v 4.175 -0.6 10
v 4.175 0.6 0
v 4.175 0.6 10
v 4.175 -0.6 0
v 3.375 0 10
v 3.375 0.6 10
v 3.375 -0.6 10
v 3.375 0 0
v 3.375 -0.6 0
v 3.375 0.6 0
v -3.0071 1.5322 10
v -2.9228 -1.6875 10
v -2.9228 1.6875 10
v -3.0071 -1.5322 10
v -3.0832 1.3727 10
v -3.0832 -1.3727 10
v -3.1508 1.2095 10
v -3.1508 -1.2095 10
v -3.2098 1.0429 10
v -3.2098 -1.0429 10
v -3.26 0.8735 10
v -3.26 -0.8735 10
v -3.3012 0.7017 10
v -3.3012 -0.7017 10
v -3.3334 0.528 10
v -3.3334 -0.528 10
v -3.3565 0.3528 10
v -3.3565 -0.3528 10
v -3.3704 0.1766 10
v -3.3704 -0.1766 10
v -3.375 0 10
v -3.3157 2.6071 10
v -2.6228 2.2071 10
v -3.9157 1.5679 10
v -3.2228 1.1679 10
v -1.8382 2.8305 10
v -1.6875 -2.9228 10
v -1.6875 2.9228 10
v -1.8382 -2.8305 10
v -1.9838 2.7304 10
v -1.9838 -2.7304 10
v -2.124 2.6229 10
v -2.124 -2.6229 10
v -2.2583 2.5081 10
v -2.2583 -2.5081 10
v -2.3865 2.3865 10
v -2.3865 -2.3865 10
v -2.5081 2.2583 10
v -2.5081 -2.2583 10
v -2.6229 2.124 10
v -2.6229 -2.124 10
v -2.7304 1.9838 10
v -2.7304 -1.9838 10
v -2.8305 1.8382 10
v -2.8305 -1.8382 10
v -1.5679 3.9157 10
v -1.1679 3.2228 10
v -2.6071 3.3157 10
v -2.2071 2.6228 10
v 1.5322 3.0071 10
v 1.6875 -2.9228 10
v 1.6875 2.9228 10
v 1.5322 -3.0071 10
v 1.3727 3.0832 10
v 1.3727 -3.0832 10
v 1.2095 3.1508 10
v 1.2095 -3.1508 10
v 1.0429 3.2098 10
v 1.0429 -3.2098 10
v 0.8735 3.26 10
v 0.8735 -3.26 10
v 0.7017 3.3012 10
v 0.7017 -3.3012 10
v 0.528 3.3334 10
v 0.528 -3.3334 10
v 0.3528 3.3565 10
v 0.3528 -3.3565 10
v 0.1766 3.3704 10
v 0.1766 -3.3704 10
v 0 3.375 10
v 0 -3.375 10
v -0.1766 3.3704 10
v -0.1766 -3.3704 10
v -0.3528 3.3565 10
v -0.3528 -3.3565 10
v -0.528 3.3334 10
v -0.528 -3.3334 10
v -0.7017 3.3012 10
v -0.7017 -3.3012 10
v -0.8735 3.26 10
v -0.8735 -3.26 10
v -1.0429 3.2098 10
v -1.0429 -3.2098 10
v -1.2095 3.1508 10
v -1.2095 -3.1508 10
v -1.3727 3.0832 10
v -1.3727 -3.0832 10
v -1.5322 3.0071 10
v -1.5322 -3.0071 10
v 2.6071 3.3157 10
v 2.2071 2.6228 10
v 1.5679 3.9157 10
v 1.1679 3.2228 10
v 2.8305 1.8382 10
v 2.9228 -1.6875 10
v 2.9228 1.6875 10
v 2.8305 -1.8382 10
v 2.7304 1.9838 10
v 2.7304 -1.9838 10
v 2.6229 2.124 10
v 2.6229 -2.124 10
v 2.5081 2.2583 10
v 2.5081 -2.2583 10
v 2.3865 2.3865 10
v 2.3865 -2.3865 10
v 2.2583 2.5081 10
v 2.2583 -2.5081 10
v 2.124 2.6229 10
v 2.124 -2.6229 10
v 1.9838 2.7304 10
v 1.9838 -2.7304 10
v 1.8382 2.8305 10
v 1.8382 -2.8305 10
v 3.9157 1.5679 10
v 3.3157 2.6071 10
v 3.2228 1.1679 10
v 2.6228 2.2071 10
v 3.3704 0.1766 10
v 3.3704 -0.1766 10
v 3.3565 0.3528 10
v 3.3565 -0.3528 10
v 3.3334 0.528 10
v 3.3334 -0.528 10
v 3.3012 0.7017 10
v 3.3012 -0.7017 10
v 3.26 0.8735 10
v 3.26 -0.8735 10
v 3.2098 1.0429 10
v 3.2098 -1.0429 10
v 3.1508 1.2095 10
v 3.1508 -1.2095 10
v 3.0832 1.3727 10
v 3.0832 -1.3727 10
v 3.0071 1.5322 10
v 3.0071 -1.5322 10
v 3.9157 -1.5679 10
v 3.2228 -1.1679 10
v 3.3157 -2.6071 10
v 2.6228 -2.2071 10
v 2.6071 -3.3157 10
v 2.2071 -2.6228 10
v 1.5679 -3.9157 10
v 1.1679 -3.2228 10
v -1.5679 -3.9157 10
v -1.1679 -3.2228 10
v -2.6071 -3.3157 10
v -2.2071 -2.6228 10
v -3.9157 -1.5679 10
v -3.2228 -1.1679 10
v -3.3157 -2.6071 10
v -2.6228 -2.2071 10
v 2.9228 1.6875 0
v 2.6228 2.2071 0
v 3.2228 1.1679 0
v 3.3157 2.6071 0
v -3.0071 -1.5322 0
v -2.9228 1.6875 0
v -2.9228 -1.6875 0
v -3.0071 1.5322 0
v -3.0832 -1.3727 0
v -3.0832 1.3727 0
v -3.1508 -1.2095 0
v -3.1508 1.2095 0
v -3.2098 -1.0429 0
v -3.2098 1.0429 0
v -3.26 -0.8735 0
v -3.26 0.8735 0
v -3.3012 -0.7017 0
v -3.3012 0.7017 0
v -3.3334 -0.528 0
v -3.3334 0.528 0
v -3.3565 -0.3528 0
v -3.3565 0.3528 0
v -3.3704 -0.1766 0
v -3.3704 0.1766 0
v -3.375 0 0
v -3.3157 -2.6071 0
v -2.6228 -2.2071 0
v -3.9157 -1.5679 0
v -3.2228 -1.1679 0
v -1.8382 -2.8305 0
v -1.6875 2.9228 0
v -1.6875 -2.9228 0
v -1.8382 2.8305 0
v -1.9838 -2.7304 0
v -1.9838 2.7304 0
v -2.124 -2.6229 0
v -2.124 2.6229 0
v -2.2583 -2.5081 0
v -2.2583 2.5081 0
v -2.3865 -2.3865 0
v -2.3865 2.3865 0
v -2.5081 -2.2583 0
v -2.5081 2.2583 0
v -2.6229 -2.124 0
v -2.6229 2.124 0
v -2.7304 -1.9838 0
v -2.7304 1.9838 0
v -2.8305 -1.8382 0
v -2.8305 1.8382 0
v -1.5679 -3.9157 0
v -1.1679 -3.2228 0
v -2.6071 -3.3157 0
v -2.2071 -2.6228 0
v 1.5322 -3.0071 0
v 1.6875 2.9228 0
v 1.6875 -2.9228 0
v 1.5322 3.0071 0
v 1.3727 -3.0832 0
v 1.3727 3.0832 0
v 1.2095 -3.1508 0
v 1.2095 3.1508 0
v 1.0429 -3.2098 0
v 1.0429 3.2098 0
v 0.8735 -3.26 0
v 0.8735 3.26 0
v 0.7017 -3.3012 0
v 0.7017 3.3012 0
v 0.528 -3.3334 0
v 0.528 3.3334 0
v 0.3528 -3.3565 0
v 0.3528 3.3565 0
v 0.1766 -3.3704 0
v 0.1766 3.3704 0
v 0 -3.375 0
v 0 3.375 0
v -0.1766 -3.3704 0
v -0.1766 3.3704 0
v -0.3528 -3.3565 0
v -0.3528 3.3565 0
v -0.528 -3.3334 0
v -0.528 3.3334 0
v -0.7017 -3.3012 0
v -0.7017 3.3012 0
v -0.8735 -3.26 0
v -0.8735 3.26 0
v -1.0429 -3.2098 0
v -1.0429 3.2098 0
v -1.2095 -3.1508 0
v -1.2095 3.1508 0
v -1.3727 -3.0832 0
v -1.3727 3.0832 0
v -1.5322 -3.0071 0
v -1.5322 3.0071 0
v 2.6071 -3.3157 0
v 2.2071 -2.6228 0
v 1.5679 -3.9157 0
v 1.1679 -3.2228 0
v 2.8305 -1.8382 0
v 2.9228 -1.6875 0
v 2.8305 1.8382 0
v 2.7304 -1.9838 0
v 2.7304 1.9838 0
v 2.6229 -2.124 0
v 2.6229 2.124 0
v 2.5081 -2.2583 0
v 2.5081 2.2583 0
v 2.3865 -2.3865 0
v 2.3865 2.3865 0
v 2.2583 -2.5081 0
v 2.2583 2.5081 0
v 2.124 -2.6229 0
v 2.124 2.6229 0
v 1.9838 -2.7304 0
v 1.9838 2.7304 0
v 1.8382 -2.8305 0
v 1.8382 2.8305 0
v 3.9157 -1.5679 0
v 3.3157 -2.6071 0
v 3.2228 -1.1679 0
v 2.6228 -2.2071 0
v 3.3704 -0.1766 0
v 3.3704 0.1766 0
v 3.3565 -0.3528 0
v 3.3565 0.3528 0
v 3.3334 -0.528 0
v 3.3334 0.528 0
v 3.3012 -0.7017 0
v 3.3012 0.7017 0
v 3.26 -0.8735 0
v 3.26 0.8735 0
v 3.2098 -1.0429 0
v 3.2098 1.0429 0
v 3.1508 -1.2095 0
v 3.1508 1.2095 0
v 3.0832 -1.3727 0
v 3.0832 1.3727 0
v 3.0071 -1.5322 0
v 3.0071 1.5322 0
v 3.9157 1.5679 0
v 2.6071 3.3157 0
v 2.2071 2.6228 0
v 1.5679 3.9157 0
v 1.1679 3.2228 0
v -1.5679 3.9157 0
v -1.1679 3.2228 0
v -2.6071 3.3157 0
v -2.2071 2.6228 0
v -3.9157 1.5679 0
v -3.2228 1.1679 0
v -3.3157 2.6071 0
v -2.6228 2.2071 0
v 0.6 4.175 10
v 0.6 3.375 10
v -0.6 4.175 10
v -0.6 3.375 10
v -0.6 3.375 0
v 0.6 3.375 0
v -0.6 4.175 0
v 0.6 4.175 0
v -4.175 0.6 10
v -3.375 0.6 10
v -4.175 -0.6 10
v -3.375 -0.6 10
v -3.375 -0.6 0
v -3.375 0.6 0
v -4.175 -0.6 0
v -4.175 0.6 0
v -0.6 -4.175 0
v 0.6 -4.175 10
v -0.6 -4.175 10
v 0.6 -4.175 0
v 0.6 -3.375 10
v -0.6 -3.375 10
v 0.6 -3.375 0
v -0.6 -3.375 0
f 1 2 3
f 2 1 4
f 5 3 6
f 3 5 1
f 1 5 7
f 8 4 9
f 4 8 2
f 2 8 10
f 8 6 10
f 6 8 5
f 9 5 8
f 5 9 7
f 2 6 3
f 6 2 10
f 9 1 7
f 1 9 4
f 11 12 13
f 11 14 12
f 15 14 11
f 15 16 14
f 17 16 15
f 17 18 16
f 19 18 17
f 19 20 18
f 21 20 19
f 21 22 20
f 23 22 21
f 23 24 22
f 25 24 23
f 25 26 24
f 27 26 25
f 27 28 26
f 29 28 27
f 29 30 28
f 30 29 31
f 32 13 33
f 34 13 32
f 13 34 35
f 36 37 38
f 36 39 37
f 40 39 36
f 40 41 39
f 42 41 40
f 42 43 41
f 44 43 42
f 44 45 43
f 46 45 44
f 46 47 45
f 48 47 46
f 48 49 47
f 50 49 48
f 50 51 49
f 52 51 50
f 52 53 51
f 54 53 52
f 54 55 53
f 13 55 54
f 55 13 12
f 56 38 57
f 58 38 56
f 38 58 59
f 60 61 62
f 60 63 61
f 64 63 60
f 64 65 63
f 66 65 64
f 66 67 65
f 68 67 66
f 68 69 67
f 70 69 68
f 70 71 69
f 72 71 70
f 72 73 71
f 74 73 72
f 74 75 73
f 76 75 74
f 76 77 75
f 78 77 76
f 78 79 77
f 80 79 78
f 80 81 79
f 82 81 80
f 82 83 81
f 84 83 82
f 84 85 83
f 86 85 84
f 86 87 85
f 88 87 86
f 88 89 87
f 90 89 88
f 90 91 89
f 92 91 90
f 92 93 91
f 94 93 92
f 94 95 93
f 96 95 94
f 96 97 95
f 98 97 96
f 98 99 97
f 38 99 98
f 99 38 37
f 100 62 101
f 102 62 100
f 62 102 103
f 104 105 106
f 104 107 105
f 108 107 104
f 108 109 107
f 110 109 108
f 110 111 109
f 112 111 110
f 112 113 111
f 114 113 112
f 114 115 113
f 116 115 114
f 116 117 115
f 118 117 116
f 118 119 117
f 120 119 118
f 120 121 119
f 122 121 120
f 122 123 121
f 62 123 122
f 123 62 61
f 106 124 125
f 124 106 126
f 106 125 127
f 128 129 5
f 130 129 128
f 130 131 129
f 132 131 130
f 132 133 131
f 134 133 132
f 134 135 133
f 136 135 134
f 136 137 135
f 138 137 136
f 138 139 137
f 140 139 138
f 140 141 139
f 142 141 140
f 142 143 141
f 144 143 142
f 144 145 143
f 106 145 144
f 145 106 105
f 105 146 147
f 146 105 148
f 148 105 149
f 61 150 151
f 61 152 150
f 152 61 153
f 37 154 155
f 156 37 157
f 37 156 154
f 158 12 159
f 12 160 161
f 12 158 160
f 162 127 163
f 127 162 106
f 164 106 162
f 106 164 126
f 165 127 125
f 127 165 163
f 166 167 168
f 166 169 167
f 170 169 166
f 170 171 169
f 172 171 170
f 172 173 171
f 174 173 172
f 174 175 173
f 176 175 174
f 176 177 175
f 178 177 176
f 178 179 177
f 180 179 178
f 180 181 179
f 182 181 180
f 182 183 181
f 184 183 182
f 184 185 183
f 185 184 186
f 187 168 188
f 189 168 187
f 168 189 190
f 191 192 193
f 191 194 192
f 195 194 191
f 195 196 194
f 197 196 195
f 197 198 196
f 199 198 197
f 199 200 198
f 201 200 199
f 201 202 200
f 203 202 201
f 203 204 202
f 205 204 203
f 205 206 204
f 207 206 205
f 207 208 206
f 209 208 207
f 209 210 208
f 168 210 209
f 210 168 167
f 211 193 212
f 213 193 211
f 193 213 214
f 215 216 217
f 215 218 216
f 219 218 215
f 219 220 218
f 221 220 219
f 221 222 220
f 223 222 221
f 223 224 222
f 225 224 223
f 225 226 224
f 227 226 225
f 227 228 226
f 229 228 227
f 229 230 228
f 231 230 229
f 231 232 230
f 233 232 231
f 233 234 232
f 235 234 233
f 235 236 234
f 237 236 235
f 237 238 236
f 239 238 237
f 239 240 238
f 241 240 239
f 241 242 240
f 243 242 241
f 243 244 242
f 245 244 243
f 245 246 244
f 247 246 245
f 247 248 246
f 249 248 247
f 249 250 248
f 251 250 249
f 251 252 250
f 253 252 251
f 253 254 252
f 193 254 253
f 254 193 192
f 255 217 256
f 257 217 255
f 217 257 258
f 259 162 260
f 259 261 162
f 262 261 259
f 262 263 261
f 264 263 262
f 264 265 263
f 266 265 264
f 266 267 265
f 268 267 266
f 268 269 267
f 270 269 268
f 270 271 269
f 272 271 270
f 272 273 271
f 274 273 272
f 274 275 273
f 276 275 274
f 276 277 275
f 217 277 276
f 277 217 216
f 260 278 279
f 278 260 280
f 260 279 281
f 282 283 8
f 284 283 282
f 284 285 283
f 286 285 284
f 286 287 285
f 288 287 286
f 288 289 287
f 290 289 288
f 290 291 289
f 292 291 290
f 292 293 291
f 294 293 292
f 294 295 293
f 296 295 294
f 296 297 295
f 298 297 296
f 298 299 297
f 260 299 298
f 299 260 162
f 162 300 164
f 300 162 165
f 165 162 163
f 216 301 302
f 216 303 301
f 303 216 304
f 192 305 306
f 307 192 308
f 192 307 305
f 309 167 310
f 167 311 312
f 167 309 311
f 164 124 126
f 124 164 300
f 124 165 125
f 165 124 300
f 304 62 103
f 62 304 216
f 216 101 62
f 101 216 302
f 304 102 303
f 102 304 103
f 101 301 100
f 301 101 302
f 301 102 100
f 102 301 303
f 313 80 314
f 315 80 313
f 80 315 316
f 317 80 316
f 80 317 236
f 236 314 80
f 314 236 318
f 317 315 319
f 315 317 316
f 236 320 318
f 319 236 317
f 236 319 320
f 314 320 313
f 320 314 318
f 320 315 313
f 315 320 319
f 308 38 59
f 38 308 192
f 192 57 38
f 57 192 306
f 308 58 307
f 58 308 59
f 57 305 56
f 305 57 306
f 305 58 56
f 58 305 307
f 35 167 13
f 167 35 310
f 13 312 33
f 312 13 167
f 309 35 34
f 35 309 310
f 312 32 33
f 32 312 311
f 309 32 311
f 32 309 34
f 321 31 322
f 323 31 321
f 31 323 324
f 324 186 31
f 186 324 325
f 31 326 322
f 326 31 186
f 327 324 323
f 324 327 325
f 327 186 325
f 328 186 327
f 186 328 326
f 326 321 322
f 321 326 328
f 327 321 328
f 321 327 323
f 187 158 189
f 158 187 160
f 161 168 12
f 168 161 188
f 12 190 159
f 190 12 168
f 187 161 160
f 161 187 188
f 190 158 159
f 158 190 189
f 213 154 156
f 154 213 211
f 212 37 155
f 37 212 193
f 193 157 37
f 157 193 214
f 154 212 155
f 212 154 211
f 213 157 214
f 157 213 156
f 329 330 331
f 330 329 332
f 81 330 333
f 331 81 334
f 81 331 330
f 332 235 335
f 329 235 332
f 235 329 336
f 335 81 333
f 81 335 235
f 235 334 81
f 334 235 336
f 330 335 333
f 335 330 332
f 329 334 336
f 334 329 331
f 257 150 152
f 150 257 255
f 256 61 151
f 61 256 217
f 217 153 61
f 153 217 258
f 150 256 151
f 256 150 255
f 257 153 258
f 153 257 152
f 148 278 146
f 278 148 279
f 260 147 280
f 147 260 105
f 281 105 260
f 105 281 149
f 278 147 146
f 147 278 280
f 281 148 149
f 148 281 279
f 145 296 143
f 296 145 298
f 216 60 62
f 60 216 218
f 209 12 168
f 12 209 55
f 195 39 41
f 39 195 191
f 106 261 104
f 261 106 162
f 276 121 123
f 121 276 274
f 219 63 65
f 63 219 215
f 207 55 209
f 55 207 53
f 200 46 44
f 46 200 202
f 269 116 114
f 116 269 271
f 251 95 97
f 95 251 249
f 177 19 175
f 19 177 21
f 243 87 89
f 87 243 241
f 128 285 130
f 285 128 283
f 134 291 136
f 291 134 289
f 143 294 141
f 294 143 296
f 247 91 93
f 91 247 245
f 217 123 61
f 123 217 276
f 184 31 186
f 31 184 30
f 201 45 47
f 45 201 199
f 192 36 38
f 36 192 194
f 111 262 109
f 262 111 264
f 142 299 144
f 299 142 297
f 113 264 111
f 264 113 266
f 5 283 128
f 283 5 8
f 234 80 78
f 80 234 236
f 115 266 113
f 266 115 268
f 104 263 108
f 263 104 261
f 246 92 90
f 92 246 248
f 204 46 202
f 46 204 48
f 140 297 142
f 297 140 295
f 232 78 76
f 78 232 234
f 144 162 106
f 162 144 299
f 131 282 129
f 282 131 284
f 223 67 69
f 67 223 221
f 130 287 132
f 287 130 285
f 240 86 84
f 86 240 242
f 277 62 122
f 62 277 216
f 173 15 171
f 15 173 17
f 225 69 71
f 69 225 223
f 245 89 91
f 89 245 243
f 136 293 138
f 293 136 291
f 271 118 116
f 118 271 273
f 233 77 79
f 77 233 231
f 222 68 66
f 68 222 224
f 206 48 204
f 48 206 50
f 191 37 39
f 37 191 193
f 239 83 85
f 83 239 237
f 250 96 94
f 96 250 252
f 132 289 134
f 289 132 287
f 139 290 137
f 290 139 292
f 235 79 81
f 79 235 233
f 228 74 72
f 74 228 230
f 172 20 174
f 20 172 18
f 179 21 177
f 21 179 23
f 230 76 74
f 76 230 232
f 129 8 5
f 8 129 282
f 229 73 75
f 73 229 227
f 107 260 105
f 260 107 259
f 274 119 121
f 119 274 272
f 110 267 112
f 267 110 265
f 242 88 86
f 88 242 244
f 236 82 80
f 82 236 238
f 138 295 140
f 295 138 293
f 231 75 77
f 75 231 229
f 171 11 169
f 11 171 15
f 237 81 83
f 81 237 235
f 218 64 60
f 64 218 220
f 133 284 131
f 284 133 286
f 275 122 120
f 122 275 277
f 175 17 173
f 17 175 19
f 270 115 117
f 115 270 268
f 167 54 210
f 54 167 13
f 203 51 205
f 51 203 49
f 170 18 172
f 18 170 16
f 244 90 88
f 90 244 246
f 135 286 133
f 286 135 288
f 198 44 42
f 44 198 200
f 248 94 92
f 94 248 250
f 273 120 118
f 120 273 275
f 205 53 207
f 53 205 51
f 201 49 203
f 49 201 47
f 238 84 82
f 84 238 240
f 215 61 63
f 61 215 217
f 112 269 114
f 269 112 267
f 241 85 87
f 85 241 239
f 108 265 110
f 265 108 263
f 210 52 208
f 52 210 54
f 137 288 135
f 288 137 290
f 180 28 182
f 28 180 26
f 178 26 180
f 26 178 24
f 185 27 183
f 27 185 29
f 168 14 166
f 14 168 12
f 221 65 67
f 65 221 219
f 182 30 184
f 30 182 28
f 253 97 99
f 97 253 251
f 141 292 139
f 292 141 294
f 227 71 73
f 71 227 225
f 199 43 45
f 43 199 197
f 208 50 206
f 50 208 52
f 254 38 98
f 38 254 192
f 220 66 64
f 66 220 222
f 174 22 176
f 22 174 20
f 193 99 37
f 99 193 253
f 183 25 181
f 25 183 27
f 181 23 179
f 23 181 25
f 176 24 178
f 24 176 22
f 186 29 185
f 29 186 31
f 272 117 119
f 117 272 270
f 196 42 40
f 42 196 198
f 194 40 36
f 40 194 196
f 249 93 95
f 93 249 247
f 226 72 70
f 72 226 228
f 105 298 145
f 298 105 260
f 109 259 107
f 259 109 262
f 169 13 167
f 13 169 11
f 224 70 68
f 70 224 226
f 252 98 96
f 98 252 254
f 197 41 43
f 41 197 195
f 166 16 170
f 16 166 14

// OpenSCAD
$fn = 120;

// Timing pulley (simplified) with 12 teeth and 7.15mm pitch diameter.
// This is a generic approximation: teeth are modeled as rectangular protrusions
// around a pitch circle. Adjust parameters as needed for a specific belt profile.

teeth = 12;
pitch_diameter = 7.15;          // mm
pitch_radius = pitch_diameter/2;

pulley_height = 10;             // mm
hub_diameter = 6.0;             // mm (core cylinder diameter)
tooth_radial_height = 0.8;      // mm (tooth protrusion beyond hub)
tooth_tangential_width = 1.2;   // mm (tooth width along circumference)
tooth_root_clearance = 0.2;     // mm (hub slightly under pitch circle)

// Derived
hub_radius = max(0.1, pitch_radius - tooth_root_clearance);
outer_radius = hub_radius + tooth_radial_height;

module pulley() {
    union() {
        // Hub/body
        cylinder(h=pulley_height, r=hub_radius);

        // Teeth
        for (i = [0:teeth-1]) {
            rotate([0,0, i*360/teeth])
                translate([hub_radius, -tooth_tangential_width/2, 0])
                    cube([tooth_radial_height, tooth_tangential_width, pulley_height], center=false);
        }

        // Slight outer rounding (optional)
        // Uncomment to soften edges:
        // difference() {
        //     cylinder(h=pulley_height, r=outer_radius);
        //     cylinder(h=pulley_height, r=outer_radius-0.2);
        // }
    }
}

pulley();
